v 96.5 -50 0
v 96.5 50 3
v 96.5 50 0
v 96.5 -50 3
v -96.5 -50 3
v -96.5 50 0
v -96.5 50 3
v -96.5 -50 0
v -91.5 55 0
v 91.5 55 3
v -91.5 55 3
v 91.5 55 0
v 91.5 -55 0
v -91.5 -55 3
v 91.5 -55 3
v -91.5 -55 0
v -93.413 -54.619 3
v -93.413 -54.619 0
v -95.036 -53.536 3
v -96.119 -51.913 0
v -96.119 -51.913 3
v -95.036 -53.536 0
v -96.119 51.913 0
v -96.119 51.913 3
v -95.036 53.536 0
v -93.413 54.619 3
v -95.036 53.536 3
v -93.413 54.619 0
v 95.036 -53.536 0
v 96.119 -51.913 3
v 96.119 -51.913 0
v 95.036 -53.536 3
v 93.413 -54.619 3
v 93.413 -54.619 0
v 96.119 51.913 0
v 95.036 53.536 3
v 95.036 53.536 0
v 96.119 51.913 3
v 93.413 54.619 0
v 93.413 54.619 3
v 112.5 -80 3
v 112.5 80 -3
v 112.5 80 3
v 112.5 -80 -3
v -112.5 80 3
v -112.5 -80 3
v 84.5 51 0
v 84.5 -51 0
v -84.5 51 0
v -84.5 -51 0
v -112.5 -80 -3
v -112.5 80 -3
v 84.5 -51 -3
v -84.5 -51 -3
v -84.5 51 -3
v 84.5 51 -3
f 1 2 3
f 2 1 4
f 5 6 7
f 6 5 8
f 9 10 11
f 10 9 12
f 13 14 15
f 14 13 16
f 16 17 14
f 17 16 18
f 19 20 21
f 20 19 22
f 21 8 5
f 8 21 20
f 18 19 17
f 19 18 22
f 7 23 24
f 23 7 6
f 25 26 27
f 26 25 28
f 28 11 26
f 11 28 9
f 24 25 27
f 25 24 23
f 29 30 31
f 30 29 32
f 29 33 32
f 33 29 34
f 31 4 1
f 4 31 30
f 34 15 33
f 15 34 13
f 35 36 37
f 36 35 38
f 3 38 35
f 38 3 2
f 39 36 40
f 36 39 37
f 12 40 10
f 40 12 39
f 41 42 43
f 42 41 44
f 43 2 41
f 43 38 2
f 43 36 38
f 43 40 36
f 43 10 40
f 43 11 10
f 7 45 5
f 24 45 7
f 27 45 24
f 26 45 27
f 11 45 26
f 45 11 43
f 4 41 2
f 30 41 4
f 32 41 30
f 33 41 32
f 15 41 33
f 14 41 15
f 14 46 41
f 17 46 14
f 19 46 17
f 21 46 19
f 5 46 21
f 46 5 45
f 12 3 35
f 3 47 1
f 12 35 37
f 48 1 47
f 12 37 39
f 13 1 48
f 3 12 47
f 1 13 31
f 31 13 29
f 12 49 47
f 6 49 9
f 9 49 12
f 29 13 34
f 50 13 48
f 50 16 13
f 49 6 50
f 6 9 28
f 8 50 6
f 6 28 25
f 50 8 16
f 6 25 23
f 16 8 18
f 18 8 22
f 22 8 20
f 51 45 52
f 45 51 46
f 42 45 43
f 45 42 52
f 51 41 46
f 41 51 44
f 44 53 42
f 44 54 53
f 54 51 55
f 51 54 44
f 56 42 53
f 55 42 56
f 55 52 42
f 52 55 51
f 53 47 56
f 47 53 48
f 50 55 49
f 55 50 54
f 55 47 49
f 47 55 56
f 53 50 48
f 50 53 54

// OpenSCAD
module case_screen_rpi_7inch_type1_pc1(CASE_W=225,CASE_L=160,CASE_H=3)
{
    
    /////////////////////////////////////////////////////////////////////////////////////
    // DATA
    /////////////////////////////////////////////////////////////////////////////////////

    RP3_7INCH_SCREEN_W=193.0;
    RP3_7INCH_SCREEN_L=110.0;
    
    RP3_7INCH_SCREEN_H=CASE_H+2;//este valor es para restar solmente
    RP3_7INCH_SCREEN_R=5;
    
    if(CASE_W<RP3_7INCH_SCREEN_W)
    {
        echo("<font color='red'> CASE_W is less than rpi 7inch (193 mm) </font>");
        assert(false);
    }
    
    if(CASE_L<RP3_7INCH_SCREEN_L)
    {
        echo("<font color='red'> CASE_L is less than rpi 7inch (110 mm) </font>");
        assert(false);
    }
    

    
    /////////////////////////////////////////////////////////////////////////////////////
    // SCREEN 
    /////////////////////////////////////////////////////////////////////////////////////
    
    color("Black")
    translate([0,0,CASE_H/2])
    difference()
    {
        cube([CASE_W,CASE_L,CASE_H], center=true);
        union()
        {
            translate([-RP3_7INCH_SCREEN_W/2+RP3_7INCH_SCREEN_R,-RP3_7INCH_SCREEN_L/2+RP3_7INCH_SCREEN_R,0])  
                cylinder(h=RP3_7INCH_SCREEN_H,r=RP3_7INCH_SCREEN_R, center=true);
            translate([-RP3_7INCH_SCREEN_W/2+RP3_7INCH_SCREEN_R,+RP3_7INCH_SCREEN_L/2-RP3_7INCH_SCREEN_R,0])  
                cylinder(h=RP3_7INCH_SCREEN_H,r=RP3_7INCH_SCREEN_R, center=true);
            translate([+RP3_7INCH_SCREEN_W/2-RP3_7INCH_SCREEN_R,-RP3_7INCH_SCREEN_L/2+RP3_7INCH_SCREEN_R,0])  
                cylinder(h=RP3_7INCH_SCREEN_H,r=RP3_7INCH_SCREEN_R, center=true);
            translate([+RP3_7INCH_SCREEN_W/2-RP3_7INCH_SCREEN_R,+RP3_7INCH_SCREEN_L/2-RP3_7INCH_SCREEN_R,0])  
                cylinder(h=RP3_7INCH_SCREEN_H,r=RP3_7INCH_SCREEN_R, center=true);
 
            difference()
            {
                cube([RP3_7INCH_SCREEN_W,RP3_7INCH_SCREEN_L,RP3_7INCH_SCREEN_H], center=true);
    
                translate([-RP3_7INCH_SCREEN_W/2,-RP3_7INCH_SCREEN_L/2,0])  
                    cube([RP3_7INCH_SCREEN_R*2,RP3_7INCH_SCREEN_R*2,RP3_7INCH_SCREEN_H+10], center=true);
                translate([-RP3_7INCH_SCREEN_W/2,+RP3_7INCH_SCREEN_L/2,0])  
                    cube([RP3_7INCH_SCREEN_R*2,RP3_7INCH_SCREEN_R*2,RP3_7INCH_SCREEN_H+10], center=true);
                translate([+RP3_7INCH_SCREEN_W/2,-RP3_7INCH_SCREEN_L/2,0])  
                    cube([RP3_7INCH_SCREEN_R*2,RP3_7INCH_SCREEN_R*2,RP3_7INCH_SCREEN_H+10], center=true);
                translate([+RP3_7INCH_SCREEN_W/2,+RP3_7INCH_SCREEN_L/2,0])  
                    cube([RP3_7INCH_SCREEN_R*2,RP3_7INCH_SCREEN_R*2,RP3_7INCH_SCREEN_H+10], center=true);        
            }
        }
    }


}

module case_screen_rpi_7inch_type1_pc2(CASE_W=225,CASE_L=160,CASE_H=3)
{
    
    /////////////////////////////////////////////////////////////////////////////////////
    // DATA
    /////////////////////////////////////////////////////////////////////////////////////

    RP3_7INCH_SCREEN_W=193.0;
    RP3_7INCH_SCREEN_L=110.0;
    
    RP3_7INCH_SCREEN_H=CASE_H+2;//este valor es para restar solmente
    RP3_7INCH_SCREEN_R=5;
    
    if(CASE_W<RP3_7INCH_SCREEN_W)
    {
        echo("<font color='red'> CASE_W is less than rpi 7inch (193 mm) </font>");
        assert(false);
    }
    
    if(CASE_L<RP3_7INCH_SCREEN_L)
    {
        echo("<font color='red'> CASE_L is less than rpi 7inch (110 mm) </font>");
        assert(false);
    }
    
    /////////////////////////////////////////////////////////////////////////////////////
    // METAL
    /////////////////////////////////////////////////////////////////////////////////////
    
    RP3_7INCH_METAL_W=RP3_7INCH_SCREEN_W-24;
    RP3_7INCH_METAL_L=RP3_7INCH_SCREEN_L-8;
    RP3_7INCH_METAL_H=CASE_H+2;    

    color("Silver")
    translate([0,0,-CASE_H/2])
    difference()
    {
        cube([CASE_W,CASE_L,CASE_H], center=true);
        
        cube([RP3_7INCH_METAL_W,RP3_7INCH_METAL_L,RP3_7INCH_METAL_H], center=true);
    }
}

module case_screen_rpi_7inch_type1()
{
    case_screen_rpi_7inch_type1_pc1();
    case_screen_rpi_7inch_type1_pc2();
}

case_screen_rpi_7inch_type1();
